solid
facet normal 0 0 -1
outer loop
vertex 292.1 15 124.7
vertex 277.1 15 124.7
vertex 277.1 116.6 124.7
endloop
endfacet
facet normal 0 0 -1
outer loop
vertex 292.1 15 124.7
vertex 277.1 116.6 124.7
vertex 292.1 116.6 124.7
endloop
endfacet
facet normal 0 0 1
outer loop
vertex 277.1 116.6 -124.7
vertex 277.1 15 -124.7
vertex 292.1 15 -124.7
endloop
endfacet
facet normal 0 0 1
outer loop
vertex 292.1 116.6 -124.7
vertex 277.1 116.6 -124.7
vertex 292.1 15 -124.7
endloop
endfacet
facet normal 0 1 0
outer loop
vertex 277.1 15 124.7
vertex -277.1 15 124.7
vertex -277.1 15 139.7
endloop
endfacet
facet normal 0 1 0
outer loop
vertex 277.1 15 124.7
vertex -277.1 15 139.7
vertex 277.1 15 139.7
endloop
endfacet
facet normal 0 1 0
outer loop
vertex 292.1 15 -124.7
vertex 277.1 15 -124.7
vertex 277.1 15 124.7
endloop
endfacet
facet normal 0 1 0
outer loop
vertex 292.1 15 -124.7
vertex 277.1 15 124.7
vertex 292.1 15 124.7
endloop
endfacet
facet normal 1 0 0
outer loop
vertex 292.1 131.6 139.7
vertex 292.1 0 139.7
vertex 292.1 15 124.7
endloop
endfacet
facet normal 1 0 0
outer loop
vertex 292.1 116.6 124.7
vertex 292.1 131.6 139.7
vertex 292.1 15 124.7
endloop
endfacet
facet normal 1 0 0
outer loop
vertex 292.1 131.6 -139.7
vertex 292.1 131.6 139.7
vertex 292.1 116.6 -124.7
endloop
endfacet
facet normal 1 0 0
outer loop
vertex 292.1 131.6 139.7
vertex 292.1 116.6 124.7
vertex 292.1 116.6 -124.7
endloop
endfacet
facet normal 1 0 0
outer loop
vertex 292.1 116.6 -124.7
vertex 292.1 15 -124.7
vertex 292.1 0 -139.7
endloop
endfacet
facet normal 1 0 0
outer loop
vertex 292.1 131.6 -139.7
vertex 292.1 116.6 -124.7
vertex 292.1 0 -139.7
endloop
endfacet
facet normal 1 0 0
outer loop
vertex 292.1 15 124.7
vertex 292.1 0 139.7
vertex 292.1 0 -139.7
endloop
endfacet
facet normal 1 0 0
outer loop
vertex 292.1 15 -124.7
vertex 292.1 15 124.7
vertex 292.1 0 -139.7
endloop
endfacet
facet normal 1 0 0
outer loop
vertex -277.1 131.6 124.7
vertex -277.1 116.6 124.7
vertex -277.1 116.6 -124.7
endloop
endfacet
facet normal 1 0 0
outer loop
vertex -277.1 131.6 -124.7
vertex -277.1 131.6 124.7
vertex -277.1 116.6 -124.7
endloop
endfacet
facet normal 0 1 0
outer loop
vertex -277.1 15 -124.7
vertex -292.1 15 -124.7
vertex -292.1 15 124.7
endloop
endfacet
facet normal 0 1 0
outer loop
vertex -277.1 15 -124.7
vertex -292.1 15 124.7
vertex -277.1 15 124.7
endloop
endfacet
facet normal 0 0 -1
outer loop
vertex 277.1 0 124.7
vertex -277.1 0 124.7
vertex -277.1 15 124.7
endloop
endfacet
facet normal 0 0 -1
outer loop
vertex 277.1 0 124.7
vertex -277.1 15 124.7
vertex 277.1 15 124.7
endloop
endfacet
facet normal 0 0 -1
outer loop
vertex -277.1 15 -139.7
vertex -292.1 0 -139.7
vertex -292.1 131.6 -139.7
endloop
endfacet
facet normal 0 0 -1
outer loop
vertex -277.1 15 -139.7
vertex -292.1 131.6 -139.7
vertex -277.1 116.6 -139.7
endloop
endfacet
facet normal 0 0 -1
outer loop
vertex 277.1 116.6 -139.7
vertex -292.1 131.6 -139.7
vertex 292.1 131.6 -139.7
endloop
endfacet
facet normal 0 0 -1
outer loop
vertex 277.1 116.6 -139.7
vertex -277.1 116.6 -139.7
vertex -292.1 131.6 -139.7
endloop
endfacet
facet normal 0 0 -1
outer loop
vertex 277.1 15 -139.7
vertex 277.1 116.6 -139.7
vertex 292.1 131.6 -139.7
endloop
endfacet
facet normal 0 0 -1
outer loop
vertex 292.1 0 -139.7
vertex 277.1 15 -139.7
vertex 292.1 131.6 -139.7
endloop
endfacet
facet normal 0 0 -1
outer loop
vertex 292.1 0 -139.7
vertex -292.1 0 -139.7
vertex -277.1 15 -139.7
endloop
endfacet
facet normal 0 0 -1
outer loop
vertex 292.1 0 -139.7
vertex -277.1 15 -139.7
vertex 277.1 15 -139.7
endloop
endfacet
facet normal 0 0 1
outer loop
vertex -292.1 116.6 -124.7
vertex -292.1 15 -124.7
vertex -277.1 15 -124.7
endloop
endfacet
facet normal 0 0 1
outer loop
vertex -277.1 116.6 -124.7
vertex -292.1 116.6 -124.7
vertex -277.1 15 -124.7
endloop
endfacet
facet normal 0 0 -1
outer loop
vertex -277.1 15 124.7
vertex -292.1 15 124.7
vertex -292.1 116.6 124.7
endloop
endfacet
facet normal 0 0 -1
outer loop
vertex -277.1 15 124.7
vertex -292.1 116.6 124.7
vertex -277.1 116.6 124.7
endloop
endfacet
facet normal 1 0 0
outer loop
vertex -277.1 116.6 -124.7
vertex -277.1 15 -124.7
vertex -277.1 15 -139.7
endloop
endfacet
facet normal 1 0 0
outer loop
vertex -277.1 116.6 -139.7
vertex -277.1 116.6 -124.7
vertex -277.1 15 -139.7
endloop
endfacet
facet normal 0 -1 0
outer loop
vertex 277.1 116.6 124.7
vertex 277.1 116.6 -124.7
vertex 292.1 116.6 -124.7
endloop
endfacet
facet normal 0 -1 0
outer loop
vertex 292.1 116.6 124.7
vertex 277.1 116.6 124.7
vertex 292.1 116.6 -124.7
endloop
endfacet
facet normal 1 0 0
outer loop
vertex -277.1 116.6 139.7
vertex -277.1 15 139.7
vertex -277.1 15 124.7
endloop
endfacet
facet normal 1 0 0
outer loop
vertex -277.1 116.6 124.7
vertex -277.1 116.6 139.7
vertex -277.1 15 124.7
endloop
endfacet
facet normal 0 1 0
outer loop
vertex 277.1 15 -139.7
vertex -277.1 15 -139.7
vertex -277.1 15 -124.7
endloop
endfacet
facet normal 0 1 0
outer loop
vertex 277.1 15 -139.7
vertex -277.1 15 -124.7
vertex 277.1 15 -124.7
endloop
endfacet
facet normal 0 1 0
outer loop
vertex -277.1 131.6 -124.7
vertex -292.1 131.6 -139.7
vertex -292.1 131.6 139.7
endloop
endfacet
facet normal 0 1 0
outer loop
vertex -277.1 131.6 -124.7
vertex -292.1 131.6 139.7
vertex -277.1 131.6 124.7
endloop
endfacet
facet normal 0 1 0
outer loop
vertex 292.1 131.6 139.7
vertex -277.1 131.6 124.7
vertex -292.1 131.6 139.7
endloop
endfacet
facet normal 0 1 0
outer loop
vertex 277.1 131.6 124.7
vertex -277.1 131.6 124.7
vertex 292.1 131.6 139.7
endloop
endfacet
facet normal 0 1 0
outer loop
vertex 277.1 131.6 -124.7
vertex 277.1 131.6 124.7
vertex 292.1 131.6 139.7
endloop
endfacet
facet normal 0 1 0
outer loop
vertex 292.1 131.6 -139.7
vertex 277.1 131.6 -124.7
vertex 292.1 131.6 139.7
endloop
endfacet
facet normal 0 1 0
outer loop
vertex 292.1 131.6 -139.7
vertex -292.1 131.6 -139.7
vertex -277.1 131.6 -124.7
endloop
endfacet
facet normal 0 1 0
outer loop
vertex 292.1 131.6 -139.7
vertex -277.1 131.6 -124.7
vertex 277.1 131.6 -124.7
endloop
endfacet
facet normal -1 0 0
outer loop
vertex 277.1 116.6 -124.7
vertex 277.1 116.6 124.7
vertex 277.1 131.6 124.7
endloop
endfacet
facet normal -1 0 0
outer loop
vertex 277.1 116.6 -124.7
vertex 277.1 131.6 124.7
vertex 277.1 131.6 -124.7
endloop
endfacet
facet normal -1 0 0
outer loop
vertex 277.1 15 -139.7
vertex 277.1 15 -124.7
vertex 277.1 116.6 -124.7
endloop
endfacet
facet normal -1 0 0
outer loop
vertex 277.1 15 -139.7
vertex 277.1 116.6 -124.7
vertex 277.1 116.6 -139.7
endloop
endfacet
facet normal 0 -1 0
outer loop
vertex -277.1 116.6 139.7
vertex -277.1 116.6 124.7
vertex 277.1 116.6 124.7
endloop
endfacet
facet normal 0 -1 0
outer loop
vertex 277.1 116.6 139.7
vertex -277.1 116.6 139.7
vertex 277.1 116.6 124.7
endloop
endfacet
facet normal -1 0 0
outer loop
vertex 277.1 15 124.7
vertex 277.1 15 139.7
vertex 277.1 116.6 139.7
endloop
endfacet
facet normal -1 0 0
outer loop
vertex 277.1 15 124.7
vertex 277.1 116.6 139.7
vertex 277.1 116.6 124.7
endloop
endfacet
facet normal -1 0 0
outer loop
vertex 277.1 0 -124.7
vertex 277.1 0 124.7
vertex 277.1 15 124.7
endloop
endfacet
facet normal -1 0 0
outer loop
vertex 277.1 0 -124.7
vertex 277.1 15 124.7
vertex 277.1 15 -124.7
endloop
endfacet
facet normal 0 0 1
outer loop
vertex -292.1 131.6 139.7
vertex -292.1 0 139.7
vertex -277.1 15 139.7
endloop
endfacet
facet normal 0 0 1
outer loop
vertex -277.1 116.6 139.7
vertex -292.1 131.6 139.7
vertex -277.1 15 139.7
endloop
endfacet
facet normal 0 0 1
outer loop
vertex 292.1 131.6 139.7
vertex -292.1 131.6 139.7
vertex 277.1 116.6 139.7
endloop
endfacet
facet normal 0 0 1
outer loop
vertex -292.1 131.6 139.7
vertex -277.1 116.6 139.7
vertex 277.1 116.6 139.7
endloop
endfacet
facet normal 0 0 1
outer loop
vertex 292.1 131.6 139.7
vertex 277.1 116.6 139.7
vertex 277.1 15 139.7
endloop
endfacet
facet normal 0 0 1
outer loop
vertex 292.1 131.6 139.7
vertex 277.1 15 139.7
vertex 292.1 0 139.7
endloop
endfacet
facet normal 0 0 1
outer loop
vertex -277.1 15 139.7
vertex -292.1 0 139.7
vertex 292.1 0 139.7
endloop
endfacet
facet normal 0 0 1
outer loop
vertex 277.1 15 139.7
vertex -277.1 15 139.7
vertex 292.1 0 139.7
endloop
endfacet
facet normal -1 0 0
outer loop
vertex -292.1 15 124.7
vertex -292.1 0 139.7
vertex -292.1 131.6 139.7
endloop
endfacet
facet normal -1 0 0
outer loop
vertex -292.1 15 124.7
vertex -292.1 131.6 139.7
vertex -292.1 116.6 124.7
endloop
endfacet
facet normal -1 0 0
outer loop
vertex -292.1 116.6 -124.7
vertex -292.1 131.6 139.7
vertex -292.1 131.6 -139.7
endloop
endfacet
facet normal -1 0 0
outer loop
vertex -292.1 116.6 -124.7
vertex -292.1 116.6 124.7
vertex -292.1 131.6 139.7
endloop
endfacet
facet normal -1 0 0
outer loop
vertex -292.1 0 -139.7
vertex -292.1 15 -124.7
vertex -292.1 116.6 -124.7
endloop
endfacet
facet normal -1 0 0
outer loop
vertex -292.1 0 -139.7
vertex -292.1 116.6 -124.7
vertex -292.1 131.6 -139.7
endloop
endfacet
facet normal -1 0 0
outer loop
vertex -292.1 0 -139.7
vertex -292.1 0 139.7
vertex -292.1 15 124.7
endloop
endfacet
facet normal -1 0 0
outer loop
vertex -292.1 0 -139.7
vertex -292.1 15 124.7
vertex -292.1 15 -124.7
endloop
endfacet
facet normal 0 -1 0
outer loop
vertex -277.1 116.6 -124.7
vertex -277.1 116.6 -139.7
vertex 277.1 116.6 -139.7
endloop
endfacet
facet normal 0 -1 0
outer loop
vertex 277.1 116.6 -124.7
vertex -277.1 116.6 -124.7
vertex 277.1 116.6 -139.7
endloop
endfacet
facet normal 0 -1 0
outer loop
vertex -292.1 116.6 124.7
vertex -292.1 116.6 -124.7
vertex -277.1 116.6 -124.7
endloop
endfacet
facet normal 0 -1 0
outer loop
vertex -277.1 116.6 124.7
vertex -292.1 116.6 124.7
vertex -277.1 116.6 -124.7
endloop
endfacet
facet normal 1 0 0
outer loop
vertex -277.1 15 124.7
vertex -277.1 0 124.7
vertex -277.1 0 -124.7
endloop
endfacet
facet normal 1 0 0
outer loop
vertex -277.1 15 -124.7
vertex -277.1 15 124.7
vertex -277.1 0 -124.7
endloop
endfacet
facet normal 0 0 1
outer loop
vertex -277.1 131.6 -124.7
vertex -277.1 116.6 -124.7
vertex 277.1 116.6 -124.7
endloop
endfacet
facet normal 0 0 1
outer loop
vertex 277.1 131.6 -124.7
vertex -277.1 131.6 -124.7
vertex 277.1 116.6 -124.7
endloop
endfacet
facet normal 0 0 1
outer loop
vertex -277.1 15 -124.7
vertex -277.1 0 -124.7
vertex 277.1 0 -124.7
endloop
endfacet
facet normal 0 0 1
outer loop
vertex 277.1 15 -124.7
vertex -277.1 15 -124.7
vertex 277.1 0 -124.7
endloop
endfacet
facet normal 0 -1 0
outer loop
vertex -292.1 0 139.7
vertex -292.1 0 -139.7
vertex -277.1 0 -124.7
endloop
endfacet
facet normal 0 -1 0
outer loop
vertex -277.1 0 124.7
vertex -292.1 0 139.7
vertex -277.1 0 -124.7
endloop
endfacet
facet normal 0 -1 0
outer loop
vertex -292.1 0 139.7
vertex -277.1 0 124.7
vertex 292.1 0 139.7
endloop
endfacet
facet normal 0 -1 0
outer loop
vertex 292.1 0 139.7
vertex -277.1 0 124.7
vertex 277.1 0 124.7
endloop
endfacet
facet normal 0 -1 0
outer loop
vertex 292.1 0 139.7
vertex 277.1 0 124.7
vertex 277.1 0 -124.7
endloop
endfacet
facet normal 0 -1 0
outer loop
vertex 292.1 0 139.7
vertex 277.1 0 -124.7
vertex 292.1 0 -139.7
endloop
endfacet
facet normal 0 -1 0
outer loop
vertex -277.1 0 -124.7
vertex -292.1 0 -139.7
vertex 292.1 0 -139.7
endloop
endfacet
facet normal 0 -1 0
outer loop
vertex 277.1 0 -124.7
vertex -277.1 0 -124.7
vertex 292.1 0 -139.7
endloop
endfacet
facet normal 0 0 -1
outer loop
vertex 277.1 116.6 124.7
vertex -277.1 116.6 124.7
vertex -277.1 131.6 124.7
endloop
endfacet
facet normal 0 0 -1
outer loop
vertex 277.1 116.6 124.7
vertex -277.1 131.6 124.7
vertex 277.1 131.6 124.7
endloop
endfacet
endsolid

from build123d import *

# Parameters (mm, degrees)
SKETCH3_W           = 584.2
SKETCH3_H           = 279.4
SKETCH3_W_2         = 554.2
SKETCH3_H_2         = 249.4
BOSS_EXTRUDE3_DEPTH = 15
SKETCH4_W           = 15
SKETCH4_H           = 15
BOSS_EXTRUDE4_DEPTH = 101.6
SKETCH5_W           = 584.2
SKETCH5_H           = 279.4
SKETCH5_W_2         = 554.2
SKETCH5_H_2         = 249.4
BOSS_EXTRUDE6_DEPTH = 15


with BuildPart() as part:
    # Sketch3 → Boss-Extrude3 (new body)
    with BuildSketch(Plane(origin=(0, 0, 0), x_dir=(1, 0, 0), z_dir=(0, 1, 0))):
        Rectangle(SKETCH3_W, SKETCH3_H)
        Rectangle(SKETCH3_W_2, SKETCH3_H_2, mode=Mode.SUBTRACT)
    extrude(amount=BOSS_EXTRUDE3_DEPTH)

    # Sketch4 → Boss-Extrude4 (add)
    with BuildSketch(Plane(origin=(0, 15, 0), x_dir=(1, 0, 0), z_dir=(0, 1, 0))):
        with Locations((-284.6, 132.2)):
            Rectangle(SKETCH4_W, SKETCH4_H)
        with Locations((-284.6, -132.2)):
            Rectangle(SKETCH4_W, SKETCH4_H)
        with Locations((284.6, -132.2)):
            Rectangle(SKETCH4_W, SKETCH4_H)
        with Locations((284.6, 132.2)):
            Rectangle(SKETCH4_W, SKETCH4_H)
    extrude(amount=BOSS_EXTRUDE4_DEPTH)

    # Sketch5 → Boss-Extrude6 (add)
    with BuildSketch(Plane(origin=(0, 116.6, 0), x_dir=(1, 0, 0), z_dir=(0, 1, 0))):
        Rectangle(SKETCH5_W, SKETCH5_H)
        Rectangle(SKETCH5_W_2, SKETCH5_H_2, mode=Mode.SUBTRACT)
    extrude(amount=BOSS_EXTRUDE6_DEPTH)


solid = part.part
